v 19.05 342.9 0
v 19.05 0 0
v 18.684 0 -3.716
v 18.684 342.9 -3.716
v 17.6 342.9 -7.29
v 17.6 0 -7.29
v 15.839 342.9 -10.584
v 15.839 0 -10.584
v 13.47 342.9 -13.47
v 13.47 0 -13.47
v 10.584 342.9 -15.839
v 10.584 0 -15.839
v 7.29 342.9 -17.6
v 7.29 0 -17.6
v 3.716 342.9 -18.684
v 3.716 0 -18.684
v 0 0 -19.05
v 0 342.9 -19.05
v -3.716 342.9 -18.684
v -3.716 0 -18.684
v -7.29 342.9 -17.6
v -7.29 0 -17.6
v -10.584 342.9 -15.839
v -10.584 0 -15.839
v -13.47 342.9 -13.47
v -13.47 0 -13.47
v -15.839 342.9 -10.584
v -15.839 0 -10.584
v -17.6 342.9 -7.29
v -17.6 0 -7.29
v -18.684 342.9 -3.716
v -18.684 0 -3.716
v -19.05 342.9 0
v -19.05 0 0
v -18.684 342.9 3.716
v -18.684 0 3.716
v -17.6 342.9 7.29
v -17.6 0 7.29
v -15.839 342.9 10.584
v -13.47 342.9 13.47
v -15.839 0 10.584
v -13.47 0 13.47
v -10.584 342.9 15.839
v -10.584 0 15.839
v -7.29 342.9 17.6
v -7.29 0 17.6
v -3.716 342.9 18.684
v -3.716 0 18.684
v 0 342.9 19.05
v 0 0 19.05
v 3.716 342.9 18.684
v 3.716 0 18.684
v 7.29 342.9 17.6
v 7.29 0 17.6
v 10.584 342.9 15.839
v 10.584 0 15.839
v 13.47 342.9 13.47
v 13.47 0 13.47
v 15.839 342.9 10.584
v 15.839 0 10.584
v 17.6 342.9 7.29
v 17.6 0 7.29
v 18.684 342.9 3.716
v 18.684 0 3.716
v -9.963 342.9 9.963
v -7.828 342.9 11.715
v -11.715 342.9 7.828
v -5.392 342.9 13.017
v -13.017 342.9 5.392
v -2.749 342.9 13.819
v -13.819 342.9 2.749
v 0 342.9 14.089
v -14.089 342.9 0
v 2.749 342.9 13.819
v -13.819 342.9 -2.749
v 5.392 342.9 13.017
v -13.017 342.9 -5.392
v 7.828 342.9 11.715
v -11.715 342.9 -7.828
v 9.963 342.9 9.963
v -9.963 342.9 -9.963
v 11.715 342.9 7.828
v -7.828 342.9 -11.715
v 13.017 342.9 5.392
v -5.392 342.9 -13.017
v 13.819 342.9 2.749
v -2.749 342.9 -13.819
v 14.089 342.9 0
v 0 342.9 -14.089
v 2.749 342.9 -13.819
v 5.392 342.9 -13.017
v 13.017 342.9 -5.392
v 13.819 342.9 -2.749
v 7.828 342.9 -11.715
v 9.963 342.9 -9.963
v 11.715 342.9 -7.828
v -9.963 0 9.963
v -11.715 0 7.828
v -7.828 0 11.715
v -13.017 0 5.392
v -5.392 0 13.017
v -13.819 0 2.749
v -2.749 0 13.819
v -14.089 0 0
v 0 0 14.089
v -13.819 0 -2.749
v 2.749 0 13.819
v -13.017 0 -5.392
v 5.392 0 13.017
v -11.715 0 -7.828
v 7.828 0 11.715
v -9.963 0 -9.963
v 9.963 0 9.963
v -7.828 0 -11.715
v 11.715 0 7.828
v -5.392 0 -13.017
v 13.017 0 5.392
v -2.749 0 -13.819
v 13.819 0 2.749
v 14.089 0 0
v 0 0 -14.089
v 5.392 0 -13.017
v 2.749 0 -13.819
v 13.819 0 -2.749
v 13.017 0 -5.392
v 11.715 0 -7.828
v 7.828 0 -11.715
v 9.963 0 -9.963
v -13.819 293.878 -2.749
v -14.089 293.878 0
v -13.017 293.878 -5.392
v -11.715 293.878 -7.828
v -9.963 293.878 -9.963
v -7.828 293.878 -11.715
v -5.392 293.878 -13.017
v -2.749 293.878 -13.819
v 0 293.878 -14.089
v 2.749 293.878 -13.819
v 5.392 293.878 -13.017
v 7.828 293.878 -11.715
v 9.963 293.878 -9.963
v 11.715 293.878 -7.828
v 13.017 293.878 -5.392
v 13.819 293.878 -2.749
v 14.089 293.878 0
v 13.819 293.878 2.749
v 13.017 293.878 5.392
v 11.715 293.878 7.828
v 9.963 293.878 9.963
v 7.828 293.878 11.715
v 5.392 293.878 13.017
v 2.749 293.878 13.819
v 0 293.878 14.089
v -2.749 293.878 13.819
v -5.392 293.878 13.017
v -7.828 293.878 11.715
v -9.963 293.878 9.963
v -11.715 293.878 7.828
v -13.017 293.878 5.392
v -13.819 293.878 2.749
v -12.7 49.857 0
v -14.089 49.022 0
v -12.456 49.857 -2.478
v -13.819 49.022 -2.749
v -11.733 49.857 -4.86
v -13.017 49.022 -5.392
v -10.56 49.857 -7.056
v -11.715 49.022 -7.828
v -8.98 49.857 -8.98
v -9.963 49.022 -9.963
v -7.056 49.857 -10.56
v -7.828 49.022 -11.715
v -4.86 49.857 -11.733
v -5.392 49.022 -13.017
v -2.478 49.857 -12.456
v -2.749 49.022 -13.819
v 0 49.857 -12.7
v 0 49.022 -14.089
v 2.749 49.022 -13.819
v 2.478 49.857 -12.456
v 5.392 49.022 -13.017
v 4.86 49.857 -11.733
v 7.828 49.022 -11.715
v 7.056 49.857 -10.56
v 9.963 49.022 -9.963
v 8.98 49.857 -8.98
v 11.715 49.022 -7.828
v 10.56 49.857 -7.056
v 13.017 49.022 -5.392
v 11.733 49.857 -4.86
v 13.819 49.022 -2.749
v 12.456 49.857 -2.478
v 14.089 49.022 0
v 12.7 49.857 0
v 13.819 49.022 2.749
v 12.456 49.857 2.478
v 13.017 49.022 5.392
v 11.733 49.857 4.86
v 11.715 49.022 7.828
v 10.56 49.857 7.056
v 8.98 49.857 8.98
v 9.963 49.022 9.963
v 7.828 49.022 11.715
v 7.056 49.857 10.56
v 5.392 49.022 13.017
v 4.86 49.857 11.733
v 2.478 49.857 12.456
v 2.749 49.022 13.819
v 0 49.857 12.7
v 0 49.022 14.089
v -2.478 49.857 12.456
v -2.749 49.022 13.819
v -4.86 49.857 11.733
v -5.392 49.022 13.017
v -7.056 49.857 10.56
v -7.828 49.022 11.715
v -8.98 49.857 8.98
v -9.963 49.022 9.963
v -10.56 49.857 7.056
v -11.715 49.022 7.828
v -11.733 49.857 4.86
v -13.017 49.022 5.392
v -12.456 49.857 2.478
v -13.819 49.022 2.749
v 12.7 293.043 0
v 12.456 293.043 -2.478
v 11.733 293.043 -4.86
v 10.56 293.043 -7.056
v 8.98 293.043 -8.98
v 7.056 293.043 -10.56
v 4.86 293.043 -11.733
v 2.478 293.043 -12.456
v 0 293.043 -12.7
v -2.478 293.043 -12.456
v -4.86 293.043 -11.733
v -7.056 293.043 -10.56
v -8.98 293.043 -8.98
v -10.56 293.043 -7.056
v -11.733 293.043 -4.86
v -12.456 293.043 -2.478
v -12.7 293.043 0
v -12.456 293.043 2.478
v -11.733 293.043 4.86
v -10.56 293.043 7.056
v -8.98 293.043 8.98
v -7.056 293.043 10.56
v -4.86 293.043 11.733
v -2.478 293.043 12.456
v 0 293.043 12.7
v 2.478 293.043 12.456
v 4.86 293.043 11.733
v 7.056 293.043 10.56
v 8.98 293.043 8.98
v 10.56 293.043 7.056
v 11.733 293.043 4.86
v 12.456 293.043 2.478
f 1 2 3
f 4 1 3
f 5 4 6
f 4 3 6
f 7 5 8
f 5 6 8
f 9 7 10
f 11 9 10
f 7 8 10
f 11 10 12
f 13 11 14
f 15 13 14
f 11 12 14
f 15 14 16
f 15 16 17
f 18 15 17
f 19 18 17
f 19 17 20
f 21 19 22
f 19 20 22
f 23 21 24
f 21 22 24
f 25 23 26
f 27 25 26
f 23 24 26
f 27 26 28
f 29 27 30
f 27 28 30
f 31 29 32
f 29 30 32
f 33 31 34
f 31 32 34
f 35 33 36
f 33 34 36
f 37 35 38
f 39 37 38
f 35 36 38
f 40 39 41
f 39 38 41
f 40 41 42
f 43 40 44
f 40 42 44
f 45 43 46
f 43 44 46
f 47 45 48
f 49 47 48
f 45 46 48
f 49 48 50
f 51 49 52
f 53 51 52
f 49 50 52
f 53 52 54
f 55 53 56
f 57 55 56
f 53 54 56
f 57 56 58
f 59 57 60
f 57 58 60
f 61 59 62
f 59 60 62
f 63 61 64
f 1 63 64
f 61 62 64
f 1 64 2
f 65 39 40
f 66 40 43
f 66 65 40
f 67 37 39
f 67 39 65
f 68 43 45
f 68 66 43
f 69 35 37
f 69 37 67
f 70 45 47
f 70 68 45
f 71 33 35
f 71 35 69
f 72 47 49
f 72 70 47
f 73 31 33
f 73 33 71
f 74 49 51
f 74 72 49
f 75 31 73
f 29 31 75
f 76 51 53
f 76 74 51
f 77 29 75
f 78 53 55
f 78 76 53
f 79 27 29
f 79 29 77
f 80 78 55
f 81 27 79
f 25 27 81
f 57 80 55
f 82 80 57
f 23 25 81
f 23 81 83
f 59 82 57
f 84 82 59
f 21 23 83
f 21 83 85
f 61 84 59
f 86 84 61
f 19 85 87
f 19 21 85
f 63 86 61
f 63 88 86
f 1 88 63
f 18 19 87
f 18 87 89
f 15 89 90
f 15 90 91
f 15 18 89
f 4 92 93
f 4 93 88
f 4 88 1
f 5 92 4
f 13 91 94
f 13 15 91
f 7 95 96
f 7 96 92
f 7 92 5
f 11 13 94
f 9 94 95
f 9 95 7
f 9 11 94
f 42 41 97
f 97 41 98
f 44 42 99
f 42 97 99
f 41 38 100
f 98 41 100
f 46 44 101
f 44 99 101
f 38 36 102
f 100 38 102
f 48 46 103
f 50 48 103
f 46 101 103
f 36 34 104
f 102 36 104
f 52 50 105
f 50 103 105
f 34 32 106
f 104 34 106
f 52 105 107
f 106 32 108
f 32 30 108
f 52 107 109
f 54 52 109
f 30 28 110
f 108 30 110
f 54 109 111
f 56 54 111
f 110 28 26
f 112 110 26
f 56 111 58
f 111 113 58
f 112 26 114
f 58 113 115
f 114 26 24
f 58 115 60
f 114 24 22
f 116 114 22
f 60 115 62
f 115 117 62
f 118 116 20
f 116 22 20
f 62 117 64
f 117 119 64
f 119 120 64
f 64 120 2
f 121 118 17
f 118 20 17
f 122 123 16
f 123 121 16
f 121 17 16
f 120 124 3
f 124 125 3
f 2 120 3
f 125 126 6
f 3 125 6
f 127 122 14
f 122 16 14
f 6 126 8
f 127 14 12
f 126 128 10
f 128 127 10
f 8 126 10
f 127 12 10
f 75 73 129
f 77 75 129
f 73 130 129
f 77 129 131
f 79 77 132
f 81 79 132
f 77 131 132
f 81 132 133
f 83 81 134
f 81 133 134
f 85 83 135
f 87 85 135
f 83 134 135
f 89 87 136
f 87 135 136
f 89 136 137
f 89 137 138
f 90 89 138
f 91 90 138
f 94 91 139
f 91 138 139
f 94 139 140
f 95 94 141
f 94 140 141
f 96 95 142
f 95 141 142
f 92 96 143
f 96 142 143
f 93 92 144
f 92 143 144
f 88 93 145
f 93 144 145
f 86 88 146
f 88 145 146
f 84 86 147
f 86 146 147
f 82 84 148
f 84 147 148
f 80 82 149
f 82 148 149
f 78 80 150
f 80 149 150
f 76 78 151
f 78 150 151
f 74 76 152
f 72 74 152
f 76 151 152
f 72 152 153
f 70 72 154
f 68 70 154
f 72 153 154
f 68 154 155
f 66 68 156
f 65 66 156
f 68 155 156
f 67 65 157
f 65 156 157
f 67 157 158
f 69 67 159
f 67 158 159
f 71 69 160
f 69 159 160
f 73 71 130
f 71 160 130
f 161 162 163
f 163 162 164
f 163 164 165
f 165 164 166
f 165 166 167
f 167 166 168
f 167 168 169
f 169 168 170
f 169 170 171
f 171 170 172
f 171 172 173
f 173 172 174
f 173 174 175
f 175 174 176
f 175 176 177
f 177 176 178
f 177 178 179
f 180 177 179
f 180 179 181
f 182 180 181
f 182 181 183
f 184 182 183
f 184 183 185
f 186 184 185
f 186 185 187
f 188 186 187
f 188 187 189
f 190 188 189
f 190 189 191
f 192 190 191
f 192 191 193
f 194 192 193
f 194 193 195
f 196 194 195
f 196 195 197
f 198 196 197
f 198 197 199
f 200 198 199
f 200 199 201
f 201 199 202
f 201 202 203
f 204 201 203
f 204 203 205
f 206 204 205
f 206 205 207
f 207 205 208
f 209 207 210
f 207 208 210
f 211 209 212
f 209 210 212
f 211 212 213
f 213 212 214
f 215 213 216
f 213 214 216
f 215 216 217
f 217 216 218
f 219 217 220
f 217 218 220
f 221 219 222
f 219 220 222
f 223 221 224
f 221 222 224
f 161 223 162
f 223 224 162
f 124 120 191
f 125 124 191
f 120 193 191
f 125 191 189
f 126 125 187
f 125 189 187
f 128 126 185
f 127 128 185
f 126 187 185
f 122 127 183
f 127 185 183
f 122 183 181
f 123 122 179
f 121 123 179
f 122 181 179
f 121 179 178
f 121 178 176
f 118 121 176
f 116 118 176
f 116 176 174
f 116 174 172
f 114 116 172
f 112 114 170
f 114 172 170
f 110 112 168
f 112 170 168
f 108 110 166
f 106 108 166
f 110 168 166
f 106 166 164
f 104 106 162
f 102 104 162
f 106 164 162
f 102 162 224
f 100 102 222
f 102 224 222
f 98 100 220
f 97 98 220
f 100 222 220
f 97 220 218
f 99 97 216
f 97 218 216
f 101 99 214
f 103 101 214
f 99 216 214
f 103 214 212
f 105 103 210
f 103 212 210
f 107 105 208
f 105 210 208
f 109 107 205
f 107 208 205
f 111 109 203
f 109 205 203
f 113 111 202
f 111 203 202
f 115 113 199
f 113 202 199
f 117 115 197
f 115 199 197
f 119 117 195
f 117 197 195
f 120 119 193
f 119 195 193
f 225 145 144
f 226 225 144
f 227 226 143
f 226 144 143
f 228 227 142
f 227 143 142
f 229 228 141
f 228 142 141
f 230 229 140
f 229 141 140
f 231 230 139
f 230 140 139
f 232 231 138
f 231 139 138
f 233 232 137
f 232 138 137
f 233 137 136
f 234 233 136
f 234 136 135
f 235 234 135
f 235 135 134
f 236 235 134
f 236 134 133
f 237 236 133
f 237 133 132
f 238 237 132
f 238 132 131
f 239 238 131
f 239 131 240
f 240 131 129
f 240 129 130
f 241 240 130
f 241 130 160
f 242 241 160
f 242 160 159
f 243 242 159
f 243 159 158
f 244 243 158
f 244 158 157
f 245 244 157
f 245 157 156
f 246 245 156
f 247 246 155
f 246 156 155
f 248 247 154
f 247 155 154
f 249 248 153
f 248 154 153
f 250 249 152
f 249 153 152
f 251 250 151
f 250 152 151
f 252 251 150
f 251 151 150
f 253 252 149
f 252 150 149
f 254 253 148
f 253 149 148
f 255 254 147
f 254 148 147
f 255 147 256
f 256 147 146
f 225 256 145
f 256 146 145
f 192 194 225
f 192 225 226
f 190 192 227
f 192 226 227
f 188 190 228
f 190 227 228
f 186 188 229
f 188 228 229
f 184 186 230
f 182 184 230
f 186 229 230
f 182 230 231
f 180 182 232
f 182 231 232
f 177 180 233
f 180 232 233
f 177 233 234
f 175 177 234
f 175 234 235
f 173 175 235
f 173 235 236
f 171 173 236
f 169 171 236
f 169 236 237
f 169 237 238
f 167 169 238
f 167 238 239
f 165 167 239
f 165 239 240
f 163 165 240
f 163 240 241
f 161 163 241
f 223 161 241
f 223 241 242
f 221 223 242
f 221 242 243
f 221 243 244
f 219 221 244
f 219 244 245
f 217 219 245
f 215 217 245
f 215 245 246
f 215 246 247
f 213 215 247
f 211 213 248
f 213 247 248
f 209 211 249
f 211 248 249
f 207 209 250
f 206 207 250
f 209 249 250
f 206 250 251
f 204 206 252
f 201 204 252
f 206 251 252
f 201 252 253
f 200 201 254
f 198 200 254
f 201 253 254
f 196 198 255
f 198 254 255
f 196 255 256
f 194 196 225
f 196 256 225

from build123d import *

# Parameters (mm, degrees)
SKETCH1_R                    = 19.05
BOSS_EXTRUDE1_DEPTH          = 342.9
SKETCH2_R                    = 12.7
CUT_EXTRUDE1_DEPTH           = 343.9
F_1_1_4_7_TAPPED_HOLE1_D     = 28.17876
F_1_1_4_7_TAPPED_HOLE1_DEPTH = 49.022
F_1_1_4_7_TAPPED_HOLE1_TIP   = 8.465753589
F_1_1_4_7_TAPPED_HOLE2_D     = 28.17876
F_1_1_4_7_TAPPED_HOLE2_DEPTH = 49.022
F_1_1_4_7_TAPPED_HOLE2_TIP   = 8.465753589


with BuildPart() as part:
    # Sketch1 → Boss-Extrude1 (new body)
    with BuildSketch(Plane(origin=(0, 0, 0), x_dir=(1, 0, 0), z_dir=(0, 1, 0))):
        Circle(SKETCH1_R)
    extrude(amount=BOSS_EXTRUDE1_DEPTH)

    # Sketch2 → Cut-Extrude1 (cut, through all)
    with BuildSketch(Plane(origin=(0, 342.9, 0), x_dir=(1, 0, 0), z_dir=(0, 1, 0))):
        Circle(SKETCH2_R)
    extrude(amount=-CUT_EXTRUDE1_DEPTH, mode=Mode.SUBTRACT)

    # 1-1/4-7 Tapped Hole1
    with Locations(Plane(origin=(0, 342.9, 0), x_dir=(1, 0, 0), z_dir=(0, 1, 0))):
        with Locations((0, 0)):
            Hole(F_1_1_4_7_TAPPED_HOLE1_D / 2, depth=F_1_1_4_7_TAPPED_HOLE1_DEPTH)
            with Locations((0, 0, -(F_1_1_4_7_TAPPED_HOLE1_DEPTH + F_1_1_4_7_TAPPED_HOLE1_TIP / 2))):  # 118° drill point
                Cone(0, F_1_1_4_7_TAPPED_HOLE1_D / 2, F_1_1_4_7_TAPPED_HOLE1_TIP, mode=Mode.SUBTRACT)

    # 1-1/4-7 Tapped Hole2
    with Locations(Plane(origin=(0, 0, 0), x_dir=(-1, 0, 0), z_dir=(0, -1, 0))):
        with Locations((0, 0)):
            Hole(F_1_1_4_7_TAPPED_HOLE2_D / 2, depth=F_1_1_4_7_TAPPED_HOLE2_DEPTH)
            with Locations((0, 0, -(F_1_1_4_7_TAPPED_HOLE2_DEPTH + F_1_1_4_7_TAPPED_HOLE2_TIP / 2))):  # 118° drill point
                Cone(0, F_1_1_4_7_TAPPED_HOLE2_D / 2, F_1_1_4_7_TAPPED_HOLE2_TIP, mode=Mode.SUBTRACT)


solid = part.part
